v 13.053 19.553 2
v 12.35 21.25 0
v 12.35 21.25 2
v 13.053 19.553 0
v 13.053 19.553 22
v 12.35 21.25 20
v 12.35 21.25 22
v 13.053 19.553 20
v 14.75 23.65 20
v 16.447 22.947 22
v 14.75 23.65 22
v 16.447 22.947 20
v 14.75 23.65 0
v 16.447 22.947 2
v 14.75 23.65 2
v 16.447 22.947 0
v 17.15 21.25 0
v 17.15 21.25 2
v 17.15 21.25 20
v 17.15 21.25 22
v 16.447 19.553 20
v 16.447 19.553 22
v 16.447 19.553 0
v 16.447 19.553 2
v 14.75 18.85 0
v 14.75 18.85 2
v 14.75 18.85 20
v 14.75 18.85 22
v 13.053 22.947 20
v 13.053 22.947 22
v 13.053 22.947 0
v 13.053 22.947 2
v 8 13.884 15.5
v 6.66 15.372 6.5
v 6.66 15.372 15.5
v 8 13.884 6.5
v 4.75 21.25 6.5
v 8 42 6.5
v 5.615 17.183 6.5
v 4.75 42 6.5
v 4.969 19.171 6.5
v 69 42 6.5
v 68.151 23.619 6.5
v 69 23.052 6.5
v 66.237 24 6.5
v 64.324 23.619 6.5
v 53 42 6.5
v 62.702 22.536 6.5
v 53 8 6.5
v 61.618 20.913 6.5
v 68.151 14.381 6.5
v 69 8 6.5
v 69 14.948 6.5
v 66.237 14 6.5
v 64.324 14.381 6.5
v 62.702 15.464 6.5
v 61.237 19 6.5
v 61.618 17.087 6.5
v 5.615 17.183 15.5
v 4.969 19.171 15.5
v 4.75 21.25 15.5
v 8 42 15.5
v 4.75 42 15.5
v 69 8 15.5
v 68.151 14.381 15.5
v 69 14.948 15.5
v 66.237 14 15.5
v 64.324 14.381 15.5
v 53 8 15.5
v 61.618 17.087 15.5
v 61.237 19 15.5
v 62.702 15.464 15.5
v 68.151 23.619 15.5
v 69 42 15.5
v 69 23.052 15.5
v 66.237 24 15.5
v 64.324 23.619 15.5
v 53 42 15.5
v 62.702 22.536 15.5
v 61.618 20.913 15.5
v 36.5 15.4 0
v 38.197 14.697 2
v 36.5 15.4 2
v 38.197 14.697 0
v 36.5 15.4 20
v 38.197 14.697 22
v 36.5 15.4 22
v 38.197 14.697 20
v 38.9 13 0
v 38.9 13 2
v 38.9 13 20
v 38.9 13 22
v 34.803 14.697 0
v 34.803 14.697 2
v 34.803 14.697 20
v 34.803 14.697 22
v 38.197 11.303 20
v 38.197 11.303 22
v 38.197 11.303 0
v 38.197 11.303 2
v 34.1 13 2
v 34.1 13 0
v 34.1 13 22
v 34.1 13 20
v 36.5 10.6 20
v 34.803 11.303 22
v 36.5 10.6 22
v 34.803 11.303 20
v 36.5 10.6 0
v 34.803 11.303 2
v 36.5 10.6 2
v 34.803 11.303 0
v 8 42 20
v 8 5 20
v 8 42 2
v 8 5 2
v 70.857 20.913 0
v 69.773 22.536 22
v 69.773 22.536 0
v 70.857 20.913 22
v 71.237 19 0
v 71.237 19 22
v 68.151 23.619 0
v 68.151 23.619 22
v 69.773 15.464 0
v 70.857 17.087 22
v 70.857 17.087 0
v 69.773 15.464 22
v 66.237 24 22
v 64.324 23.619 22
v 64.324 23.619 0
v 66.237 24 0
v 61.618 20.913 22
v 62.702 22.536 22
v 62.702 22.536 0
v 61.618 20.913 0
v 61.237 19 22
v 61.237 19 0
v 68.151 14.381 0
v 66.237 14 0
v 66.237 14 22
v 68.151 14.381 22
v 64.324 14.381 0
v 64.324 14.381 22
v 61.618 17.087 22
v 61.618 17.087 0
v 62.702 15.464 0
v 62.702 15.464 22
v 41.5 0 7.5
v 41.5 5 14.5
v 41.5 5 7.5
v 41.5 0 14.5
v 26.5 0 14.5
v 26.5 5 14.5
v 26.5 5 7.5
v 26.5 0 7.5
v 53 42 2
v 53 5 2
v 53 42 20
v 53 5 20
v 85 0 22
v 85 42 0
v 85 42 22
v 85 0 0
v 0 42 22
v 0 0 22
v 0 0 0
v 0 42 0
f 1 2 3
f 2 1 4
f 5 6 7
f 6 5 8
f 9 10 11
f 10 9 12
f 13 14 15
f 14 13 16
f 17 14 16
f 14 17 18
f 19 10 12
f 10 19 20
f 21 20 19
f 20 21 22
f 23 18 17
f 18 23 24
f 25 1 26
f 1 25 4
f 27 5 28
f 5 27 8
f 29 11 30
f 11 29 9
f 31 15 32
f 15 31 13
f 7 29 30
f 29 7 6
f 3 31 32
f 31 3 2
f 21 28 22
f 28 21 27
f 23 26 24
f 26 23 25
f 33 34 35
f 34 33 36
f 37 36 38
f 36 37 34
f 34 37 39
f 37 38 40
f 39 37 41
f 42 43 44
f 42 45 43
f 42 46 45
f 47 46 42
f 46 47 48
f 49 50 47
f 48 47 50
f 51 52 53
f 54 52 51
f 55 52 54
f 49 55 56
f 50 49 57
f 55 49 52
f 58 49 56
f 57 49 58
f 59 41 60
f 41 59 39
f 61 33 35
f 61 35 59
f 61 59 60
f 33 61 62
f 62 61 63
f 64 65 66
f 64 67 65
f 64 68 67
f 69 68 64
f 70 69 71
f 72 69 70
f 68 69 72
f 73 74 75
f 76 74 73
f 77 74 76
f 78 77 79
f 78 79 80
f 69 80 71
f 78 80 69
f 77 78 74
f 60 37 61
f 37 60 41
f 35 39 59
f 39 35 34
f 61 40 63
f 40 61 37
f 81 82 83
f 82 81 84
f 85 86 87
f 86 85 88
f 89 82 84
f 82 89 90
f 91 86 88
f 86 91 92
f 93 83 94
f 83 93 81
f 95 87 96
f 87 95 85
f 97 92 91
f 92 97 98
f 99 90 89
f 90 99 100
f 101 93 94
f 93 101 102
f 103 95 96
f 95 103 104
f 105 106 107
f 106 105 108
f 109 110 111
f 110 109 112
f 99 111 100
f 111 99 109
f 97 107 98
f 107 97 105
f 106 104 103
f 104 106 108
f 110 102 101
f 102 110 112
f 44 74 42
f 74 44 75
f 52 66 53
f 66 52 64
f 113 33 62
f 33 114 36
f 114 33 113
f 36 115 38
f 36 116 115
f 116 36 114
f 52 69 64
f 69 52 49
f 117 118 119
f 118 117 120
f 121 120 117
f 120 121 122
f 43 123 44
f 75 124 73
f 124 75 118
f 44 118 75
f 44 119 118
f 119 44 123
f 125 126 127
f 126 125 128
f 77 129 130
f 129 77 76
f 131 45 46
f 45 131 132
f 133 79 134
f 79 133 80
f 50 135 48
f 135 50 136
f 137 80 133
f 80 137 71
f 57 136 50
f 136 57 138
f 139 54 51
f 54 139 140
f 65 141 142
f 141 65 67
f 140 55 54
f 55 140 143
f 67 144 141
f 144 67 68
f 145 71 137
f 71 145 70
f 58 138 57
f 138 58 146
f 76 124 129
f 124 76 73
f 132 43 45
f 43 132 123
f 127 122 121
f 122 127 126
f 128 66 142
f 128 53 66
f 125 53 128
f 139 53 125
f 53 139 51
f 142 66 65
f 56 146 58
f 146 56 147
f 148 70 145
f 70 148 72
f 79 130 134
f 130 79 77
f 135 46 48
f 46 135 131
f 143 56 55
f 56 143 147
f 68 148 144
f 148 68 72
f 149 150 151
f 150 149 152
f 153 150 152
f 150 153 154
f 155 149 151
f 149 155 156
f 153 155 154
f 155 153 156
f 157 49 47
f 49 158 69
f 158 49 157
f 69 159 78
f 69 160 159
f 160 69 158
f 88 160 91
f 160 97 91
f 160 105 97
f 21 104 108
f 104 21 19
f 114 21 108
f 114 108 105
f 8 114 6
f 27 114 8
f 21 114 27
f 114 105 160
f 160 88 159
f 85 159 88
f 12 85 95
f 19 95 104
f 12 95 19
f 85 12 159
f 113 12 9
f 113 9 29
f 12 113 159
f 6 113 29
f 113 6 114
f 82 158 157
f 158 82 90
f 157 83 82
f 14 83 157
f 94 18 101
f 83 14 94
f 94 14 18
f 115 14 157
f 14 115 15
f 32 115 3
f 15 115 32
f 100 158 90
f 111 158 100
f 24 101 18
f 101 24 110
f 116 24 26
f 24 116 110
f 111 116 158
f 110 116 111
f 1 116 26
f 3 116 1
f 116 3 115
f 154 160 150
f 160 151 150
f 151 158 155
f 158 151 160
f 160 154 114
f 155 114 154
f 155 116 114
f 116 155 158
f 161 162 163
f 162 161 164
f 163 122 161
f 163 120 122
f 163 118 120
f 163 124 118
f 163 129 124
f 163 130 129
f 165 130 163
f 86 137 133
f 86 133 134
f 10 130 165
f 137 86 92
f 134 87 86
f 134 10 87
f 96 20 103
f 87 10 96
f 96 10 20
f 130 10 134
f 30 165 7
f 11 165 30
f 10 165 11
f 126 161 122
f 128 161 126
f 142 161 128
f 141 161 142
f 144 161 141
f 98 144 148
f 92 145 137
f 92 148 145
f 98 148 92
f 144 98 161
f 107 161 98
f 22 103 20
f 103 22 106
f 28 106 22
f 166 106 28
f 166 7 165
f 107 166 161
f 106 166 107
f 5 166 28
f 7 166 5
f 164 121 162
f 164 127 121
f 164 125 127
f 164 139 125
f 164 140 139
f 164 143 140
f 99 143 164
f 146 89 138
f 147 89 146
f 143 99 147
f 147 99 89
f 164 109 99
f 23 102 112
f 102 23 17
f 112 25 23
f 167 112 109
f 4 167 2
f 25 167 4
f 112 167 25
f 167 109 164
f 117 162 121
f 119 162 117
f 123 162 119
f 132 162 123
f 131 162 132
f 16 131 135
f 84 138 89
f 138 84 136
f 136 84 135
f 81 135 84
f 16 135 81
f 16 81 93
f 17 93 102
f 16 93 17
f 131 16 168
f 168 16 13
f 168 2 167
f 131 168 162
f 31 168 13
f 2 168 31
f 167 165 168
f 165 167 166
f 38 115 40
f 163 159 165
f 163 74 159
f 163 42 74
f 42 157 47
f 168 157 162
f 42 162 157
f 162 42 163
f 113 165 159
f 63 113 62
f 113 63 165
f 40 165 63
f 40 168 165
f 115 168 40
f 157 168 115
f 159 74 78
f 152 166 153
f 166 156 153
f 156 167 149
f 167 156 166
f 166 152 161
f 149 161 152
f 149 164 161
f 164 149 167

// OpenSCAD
pinRadius = 2.4; // 0.1560*25.4/2;
  
frontPinOffsetX = 6.75;
frontPinOffsetY = 16.25;

rearPinOffsetX = 28.5;
rearPinOffsetY = 8;

selectorRadius = 5; // Diameter: .3760" = 9.55mm
selectorOffsetX = frontPinOffsetX+(1.968*25.4) + 1.5;
selectorOffsetY = 14;

hammerLength = 41;
hammerWidth = 9;
hammerPivotRadius = 10;

triggerPackHeight = 43;
triggerPackWidth = 18;
triggerPackLength = 45;
triggerWidth = 7;

module triggerPack(pinWidth=20) {
  
  // Trigger pack body
  cube([triggerPackLength,triggerPackHeight,triggerPackWidth]);
  
  translate([0,0,triggerPackWidth/2]) {
  
    // Pins and hammer path
    translate([frontPinOffsetX,frontPinOffsetY,0]) {
      
      // Hammer pin
      cylinder(r=pinRadius, h=pinWidth, center=true);
      
      // Hammer pivot
      cylinder(r=hammerPivotRadius, h=hammerWidth, center=true);
      
      // Hammer travel
      translate([-hammerPivotRadius,0,-hammerWidth/2])
      cube([hammerLength-hammerPivotRadius,hammerLength-hammerPivotRadius,hammerWidth]);
    };
    
    // Rear pin
    translate([rearPinOffsetX,rearPinOffsetY,0])
    #cylinder(r=pinRadius, h=pinWidth, center=true);
    
    // Sear Extension
    translate([0,3,0-hammerWidth/2])
    cube([triggerPackLength+16,triggerPackHeight,hammerWidth]);
    
    // Selector
    translate([selectorOffsetX,selectorOffsetY,0])
    cylinder(r=selectorRadius, h=pinWidth, center=true);
    
    // Trigger
    translate([rearPinOffsetX - 10,-19,-3.5])
    cube([15,20,7]);
  }
}

module triggerHousing(wall=2) {
  difference() {
    cube([85,42,18 + (wall*2)]);
    
    translate([8,5,wall])
    triggerPack(pinWidth=100);
  }
}

triggerHousing();
